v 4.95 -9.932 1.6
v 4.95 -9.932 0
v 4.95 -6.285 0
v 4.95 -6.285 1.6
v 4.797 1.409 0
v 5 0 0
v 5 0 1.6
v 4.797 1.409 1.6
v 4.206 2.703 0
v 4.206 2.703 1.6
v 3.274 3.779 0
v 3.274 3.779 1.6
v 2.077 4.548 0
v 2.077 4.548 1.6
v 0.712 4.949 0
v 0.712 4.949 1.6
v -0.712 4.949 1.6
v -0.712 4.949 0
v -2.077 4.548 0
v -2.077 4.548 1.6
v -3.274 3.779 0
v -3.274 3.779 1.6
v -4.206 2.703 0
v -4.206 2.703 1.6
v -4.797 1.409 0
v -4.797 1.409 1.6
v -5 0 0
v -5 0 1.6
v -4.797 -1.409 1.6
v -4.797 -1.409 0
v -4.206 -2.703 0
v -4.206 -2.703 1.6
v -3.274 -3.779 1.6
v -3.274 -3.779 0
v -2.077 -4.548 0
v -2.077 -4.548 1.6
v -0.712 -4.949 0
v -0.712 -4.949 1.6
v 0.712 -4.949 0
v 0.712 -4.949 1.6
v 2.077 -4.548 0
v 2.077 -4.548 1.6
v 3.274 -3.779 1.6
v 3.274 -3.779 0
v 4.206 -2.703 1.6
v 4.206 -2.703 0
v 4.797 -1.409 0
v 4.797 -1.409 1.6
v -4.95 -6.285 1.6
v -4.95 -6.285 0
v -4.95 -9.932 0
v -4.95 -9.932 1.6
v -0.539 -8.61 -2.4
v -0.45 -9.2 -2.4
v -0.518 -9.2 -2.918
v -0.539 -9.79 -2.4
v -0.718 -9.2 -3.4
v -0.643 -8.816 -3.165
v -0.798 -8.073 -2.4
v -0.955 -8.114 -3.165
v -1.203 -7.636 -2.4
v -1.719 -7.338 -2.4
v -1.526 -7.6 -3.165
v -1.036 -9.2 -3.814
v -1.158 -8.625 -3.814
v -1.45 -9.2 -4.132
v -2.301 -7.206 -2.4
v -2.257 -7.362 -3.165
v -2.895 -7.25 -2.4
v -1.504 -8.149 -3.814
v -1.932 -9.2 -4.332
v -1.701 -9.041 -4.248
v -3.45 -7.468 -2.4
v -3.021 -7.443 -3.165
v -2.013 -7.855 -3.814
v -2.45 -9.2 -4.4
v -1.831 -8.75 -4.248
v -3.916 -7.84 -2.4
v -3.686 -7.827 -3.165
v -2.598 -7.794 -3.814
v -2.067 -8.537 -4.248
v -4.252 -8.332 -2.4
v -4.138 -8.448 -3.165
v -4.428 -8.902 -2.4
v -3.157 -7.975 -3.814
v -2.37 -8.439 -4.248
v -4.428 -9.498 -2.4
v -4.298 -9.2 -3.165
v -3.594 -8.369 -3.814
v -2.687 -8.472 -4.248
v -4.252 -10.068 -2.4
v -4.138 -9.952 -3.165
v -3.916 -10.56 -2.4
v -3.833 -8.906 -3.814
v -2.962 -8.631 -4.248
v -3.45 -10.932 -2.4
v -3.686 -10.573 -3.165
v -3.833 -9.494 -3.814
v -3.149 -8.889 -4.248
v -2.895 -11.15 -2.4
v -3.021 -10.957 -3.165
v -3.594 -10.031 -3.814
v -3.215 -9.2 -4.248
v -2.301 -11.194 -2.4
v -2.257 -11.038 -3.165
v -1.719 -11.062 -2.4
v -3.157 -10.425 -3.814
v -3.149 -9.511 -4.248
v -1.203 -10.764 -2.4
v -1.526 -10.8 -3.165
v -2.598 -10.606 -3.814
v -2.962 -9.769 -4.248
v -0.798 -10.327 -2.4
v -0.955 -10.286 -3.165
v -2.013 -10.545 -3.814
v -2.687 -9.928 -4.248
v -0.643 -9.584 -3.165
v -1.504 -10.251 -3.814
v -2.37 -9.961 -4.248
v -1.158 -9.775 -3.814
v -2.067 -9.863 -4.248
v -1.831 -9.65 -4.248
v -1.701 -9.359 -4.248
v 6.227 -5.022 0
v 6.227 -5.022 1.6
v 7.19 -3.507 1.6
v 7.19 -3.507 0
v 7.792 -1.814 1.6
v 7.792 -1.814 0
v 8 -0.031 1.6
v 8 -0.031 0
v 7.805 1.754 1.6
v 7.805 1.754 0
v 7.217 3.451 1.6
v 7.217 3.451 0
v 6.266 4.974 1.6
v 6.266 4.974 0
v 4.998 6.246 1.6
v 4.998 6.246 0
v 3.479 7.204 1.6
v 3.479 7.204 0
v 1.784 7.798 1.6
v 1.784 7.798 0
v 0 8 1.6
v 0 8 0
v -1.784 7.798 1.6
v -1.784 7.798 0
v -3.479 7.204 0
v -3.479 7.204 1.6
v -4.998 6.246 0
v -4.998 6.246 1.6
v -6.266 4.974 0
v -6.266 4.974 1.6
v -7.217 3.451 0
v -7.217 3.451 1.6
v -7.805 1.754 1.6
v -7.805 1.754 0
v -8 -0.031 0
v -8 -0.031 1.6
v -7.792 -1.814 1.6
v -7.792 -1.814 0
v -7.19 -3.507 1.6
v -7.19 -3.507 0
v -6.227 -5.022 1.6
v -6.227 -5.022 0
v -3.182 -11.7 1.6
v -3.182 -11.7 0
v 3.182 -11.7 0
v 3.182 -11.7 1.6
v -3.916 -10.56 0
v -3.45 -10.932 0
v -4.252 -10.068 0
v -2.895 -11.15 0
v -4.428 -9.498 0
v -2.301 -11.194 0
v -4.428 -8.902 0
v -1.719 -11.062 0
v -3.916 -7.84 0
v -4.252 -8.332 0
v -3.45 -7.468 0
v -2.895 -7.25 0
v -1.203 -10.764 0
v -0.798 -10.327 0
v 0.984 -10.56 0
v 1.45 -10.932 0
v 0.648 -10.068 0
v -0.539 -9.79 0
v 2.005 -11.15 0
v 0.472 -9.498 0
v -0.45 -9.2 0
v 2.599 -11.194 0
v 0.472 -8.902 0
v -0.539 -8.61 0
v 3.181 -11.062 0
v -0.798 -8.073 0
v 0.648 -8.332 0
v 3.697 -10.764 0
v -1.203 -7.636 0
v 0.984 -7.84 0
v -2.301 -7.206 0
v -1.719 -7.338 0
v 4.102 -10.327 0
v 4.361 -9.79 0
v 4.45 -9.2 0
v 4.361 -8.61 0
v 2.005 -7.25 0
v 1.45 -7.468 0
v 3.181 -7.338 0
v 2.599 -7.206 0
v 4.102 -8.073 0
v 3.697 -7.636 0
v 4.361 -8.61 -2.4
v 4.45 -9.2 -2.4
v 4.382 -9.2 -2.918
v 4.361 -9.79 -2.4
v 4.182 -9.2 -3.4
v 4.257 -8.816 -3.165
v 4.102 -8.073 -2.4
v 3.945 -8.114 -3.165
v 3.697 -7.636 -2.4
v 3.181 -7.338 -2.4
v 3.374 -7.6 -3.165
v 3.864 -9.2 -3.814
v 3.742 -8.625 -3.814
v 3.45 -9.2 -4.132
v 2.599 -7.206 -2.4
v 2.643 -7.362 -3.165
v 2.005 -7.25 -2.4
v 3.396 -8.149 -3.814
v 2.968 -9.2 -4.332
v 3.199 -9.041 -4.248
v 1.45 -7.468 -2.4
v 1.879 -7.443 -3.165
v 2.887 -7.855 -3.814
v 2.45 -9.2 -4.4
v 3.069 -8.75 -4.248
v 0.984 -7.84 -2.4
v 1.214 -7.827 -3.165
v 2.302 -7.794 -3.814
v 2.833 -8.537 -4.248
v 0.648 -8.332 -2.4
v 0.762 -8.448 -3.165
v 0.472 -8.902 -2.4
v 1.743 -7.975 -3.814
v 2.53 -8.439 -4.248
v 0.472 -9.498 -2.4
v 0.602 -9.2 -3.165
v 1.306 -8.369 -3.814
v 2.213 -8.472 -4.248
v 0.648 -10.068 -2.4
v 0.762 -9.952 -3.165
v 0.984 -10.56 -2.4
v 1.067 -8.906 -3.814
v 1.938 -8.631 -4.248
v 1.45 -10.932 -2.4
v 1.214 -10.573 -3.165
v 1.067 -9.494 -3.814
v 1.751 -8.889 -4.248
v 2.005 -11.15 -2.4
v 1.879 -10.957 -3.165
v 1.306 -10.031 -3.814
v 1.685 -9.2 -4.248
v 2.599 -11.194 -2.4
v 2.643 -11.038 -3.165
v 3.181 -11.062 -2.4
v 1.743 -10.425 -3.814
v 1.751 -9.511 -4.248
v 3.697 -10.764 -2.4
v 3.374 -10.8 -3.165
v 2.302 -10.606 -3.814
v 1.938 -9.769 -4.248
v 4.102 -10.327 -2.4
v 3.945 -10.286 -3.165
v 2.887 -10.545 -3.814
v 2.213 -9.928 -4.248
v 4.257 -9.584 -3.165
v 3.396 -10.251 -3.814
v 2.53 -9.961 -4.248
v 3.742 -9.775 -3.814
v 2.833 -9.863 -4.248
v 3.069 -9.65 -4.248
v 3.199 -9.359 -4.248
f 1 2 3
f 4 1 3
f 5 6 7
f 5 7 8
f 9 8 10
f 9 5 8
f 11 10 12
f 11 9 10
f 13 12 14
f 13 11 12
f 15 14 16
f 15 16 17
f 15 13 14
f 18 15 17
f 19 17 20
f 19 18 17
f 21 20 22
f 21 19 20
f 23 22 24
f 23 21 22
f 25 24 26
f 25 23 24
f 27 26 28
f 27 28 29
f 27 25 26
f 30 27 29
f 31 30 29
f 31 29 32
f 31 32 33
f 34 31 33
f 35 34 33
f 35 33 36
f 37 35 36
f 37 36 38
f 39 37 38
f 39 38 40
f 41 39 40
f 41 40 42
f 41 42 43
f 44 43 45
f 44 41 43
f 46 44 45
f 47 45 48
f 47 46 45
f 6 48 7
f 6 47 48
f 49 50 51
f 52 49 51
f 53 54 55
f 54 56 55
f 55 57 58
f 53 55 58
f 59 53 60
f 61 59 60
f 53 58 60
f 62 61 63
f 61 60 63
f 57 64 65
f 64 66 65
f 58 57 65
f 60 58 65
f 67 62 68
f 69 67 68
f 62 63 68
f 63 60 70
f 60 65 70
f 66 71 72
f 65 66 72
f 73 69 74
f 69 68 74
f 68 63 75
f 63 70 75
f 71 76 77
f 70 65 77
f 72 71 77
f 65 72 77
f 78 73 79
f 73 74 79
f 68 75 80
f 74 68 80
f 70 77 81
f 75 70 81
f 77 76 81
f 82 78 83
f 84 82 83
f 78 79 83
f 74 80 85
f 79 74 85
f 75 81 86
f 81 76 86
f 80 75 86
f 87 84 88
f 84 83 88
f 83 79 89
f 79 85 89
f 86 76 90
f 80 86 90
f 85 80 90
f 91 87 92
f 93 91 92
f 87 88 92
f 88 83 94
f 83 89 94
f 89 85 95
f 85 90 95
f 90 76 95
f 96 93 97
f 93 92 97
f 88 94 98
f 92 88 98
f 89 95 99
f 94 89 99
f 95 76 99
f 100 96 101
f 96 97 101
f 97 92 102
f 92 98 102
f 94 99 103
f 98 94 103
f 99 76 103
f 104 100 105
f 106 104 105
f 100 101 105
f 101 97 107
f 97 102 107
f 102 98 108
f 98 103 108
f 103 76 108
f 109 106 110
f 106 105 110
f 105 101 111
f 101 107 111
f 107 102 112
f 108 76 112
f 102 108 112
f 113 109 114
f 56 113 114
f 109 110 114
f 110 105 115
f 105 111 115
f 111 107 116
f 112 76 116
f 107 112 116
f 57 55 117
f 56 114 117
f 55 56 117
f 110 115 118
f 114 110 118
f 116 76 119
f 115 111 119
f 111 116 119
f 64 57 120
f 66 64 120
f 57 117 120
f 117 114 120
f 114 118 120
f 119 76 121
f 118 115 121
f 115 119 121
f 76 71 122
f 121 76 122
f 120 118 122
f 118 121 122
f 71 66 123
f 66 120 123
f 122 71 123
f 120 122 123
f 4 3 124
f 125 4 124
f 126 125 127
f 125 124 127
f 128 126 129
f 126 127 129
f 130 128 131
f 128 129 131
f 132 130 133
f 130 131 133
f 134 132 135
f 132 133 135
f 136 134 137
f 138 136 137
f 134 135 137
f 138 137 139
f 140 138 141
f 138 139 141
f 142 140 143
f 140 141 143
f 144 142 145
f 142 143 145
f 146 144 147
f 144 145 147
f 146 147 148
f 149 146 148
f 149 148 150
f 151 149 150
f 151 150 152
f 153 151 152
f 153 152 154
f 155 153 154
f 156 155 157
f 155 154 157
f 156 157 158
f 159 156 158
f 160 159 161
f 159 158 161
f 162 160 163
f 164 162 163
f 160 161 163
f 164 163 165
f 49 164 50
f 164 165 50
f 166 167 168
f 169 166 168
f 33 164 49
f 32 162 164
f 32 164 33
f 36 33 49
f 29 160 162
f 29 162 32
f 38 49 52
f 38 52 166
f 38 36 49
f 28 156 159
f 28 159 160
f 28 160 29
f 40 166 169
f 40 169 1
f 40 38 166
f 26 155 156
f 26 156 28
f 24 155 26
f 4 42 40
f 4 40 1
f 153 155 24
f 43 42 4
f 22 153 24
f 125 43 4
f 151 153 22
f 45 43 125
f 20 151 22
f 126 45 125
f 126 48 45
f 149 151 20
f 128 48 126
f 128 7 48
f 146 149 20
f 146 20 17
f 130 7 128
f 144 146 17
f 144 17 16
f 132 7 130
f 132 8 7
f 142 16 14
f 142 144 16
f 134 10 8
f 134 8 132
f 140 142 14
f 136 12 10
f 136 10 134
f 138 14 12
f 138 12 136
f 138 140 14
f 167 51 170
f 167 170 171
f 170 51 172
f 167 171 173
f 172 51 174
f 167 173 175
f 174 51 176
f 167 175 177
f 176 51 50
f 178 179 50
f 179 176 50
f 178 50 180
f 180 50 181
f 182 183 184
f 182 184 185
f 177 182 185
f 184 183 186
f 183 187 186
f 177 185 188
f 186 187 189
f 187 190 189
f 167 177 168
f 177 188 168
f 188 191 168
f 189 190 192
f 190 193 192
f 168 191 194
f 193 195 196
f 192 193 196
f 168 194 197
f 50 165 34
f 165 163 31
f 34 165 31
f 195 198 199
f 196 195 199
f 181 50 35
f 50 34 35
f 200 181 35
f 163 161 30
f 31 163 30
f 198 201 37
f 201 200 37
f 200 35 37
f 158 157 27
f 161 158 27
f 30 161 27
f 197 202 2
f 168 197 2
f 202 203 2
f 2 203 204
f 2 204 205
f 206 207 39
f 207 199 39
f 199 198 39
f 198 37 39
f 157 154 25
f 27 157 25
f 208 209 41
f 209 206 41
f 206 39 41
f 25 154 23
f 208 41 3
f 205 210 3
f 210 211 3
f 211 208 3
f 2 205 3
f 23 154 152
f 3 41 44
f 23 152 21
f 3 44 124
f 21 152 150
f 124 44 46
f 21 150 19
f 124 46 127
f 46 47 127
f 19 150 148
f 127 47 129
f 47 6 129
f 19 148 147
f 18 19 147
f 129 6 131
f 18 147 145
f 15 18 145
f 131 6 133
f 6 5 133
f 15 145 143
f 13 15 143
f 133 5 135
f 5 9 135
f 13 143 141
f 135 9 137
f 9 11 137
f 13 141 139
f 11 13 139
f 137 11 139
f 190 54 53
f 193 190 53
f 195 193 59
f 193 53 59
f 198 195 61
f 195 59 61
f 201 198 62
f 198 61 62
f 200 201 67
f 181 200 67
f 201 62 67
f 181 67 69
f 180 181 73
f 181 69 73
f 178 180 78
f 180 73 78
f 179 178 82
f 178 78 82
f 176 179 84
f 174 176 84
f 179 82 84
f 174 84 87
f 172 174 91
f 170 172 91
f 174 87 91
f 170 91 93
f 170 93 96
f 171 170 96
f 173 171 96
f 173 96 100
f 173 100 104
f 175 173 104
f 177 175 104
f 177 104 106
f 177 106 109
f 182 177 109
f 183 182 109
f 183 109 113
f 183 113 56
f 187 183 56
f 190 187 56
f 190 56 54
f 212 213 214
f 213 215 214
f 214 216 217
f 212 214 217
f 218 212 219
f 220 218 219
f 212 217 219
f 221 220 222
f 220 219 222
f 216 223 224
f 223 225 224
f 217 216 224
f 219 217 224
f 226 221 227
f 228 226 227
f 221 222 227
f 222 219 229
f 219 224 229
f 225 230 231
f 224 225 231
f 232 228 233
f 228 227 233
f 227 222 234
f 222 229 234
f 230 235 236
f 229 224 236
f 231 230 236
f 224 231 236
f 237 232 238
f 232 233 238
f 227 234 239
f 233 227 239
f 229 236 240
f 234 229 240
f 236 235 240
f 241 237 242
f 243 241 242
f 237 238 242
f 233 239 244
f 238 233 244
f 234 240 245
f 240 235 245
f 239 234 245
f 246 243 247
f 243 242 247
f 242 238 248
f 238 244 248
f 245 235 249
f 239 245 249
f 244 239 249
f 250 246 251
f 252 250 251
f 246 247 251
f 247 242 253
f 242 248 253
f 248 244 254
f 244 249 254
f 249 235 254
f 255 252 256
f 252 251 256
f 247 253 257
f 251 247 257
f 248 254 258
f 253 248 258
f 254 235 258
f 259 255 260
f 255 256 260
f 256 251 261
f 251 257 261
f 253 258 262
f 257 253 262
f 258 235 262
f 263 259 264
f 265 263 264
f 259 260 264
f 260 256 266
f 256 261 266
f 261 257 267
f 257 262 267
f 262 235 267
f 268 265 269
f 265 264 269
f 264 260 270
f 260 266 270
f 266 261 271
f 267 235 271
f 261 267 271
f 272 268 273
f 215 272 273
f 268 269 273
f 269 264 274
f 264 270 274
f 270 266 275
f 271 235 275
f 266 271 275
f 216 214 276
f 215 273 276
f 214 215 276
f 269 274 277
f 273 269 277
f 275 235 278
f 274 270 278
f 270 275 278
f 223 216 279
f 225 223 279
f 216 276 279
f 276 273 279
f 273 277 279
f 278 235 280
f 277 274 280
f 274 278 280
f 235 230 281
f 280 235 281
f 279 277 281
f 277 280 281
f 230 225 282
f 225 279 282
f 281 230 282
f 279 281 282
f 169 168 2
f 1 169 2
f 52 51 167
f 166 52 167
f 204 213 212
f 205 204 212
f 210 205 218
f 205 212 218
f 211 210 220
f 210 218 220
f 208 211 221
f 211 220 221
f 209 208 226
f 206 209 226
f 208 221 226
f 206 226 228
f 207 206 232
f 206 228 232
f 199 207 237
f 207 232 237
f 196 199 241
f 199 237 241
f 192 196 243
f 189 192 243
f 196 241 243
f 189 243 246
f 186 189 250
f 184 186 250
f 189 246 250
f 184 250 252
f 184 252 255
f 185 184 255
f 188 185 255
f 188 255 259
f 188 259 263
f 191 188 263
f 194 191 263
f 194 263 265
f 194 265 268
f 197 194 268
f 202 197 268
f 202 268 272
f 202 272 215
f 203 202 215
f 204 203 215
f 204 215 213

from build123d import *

# Parameters (mm, degrees)
SKETCH1_R           = 5
SKETCH1_R_2         = 2
BOSS_EXTRUDE1_DEPTH = 1.6
BOSS_EXTRUDE2_START = -6
SKETCH2_R           = 2
BOSS_EXTRUDE2_DEPTH = 6
FILLET1_R           = 2


with BuildPart() as part:
    # Sketch1 → Boss-Extrude1 (new body)
    with BuildSketch(Plane.XY):
        with BuildLine():
            Line((4.95, -9.932233047), (4.95, -6.284703653))
            ThreePointArc((4.95, -6.284703653), (0, 8), (-4.95, -6.284703653))
            Line((-4.95, -6.284703653), (-4.95, -9.932233047))
            Line((-4.95, -9.932233047), (-3.182233047, -11.7))
            Line((-3.182233047, -11.7), (3.182233047, -11.7))
            Line((3.182233047, -11.7), (4.95, -9.932233047))
        make_face()
        Circle(SKETCH1_R, mode=Mode.SUBTRACT)
        with Locations((2.45, -9.2)):
            Circle(SKETCH1_R_2, mode=Mode.SUBTRACT)
        with Locations((-2.45, -9.2)):
            Circle(SKETCH1_R_2, mode=Mode.SUBTRACT)
    extrude(amount=BOSS_EXTRUDE1_DEPTH)

    # Sketch2 → Boss-Extrude2 (add)
    with BuildSketch(Plane.XY.offset(1.6).offset(BOSS_EXTRUDE2_START)):
        with Locations((2.45, -9.2)):
            Circle(SKETCH2_R)
        with Locations((-2.45, -9.2)):
            Circle(SKETCH2_R)
    extrude(amount=BOSS_EXTRUDE2_DEPTH)

    # Fillet1
    fillet1_edges = [part.edges().sort_by_distance(p)[0] for p in [
        (-4.45, -9.2, -4.4),
        (0.45, -9.2, -4.4),
    ]]
    fillet(fillet1_edges, radius=FILLET1_R)


solid = part.part
